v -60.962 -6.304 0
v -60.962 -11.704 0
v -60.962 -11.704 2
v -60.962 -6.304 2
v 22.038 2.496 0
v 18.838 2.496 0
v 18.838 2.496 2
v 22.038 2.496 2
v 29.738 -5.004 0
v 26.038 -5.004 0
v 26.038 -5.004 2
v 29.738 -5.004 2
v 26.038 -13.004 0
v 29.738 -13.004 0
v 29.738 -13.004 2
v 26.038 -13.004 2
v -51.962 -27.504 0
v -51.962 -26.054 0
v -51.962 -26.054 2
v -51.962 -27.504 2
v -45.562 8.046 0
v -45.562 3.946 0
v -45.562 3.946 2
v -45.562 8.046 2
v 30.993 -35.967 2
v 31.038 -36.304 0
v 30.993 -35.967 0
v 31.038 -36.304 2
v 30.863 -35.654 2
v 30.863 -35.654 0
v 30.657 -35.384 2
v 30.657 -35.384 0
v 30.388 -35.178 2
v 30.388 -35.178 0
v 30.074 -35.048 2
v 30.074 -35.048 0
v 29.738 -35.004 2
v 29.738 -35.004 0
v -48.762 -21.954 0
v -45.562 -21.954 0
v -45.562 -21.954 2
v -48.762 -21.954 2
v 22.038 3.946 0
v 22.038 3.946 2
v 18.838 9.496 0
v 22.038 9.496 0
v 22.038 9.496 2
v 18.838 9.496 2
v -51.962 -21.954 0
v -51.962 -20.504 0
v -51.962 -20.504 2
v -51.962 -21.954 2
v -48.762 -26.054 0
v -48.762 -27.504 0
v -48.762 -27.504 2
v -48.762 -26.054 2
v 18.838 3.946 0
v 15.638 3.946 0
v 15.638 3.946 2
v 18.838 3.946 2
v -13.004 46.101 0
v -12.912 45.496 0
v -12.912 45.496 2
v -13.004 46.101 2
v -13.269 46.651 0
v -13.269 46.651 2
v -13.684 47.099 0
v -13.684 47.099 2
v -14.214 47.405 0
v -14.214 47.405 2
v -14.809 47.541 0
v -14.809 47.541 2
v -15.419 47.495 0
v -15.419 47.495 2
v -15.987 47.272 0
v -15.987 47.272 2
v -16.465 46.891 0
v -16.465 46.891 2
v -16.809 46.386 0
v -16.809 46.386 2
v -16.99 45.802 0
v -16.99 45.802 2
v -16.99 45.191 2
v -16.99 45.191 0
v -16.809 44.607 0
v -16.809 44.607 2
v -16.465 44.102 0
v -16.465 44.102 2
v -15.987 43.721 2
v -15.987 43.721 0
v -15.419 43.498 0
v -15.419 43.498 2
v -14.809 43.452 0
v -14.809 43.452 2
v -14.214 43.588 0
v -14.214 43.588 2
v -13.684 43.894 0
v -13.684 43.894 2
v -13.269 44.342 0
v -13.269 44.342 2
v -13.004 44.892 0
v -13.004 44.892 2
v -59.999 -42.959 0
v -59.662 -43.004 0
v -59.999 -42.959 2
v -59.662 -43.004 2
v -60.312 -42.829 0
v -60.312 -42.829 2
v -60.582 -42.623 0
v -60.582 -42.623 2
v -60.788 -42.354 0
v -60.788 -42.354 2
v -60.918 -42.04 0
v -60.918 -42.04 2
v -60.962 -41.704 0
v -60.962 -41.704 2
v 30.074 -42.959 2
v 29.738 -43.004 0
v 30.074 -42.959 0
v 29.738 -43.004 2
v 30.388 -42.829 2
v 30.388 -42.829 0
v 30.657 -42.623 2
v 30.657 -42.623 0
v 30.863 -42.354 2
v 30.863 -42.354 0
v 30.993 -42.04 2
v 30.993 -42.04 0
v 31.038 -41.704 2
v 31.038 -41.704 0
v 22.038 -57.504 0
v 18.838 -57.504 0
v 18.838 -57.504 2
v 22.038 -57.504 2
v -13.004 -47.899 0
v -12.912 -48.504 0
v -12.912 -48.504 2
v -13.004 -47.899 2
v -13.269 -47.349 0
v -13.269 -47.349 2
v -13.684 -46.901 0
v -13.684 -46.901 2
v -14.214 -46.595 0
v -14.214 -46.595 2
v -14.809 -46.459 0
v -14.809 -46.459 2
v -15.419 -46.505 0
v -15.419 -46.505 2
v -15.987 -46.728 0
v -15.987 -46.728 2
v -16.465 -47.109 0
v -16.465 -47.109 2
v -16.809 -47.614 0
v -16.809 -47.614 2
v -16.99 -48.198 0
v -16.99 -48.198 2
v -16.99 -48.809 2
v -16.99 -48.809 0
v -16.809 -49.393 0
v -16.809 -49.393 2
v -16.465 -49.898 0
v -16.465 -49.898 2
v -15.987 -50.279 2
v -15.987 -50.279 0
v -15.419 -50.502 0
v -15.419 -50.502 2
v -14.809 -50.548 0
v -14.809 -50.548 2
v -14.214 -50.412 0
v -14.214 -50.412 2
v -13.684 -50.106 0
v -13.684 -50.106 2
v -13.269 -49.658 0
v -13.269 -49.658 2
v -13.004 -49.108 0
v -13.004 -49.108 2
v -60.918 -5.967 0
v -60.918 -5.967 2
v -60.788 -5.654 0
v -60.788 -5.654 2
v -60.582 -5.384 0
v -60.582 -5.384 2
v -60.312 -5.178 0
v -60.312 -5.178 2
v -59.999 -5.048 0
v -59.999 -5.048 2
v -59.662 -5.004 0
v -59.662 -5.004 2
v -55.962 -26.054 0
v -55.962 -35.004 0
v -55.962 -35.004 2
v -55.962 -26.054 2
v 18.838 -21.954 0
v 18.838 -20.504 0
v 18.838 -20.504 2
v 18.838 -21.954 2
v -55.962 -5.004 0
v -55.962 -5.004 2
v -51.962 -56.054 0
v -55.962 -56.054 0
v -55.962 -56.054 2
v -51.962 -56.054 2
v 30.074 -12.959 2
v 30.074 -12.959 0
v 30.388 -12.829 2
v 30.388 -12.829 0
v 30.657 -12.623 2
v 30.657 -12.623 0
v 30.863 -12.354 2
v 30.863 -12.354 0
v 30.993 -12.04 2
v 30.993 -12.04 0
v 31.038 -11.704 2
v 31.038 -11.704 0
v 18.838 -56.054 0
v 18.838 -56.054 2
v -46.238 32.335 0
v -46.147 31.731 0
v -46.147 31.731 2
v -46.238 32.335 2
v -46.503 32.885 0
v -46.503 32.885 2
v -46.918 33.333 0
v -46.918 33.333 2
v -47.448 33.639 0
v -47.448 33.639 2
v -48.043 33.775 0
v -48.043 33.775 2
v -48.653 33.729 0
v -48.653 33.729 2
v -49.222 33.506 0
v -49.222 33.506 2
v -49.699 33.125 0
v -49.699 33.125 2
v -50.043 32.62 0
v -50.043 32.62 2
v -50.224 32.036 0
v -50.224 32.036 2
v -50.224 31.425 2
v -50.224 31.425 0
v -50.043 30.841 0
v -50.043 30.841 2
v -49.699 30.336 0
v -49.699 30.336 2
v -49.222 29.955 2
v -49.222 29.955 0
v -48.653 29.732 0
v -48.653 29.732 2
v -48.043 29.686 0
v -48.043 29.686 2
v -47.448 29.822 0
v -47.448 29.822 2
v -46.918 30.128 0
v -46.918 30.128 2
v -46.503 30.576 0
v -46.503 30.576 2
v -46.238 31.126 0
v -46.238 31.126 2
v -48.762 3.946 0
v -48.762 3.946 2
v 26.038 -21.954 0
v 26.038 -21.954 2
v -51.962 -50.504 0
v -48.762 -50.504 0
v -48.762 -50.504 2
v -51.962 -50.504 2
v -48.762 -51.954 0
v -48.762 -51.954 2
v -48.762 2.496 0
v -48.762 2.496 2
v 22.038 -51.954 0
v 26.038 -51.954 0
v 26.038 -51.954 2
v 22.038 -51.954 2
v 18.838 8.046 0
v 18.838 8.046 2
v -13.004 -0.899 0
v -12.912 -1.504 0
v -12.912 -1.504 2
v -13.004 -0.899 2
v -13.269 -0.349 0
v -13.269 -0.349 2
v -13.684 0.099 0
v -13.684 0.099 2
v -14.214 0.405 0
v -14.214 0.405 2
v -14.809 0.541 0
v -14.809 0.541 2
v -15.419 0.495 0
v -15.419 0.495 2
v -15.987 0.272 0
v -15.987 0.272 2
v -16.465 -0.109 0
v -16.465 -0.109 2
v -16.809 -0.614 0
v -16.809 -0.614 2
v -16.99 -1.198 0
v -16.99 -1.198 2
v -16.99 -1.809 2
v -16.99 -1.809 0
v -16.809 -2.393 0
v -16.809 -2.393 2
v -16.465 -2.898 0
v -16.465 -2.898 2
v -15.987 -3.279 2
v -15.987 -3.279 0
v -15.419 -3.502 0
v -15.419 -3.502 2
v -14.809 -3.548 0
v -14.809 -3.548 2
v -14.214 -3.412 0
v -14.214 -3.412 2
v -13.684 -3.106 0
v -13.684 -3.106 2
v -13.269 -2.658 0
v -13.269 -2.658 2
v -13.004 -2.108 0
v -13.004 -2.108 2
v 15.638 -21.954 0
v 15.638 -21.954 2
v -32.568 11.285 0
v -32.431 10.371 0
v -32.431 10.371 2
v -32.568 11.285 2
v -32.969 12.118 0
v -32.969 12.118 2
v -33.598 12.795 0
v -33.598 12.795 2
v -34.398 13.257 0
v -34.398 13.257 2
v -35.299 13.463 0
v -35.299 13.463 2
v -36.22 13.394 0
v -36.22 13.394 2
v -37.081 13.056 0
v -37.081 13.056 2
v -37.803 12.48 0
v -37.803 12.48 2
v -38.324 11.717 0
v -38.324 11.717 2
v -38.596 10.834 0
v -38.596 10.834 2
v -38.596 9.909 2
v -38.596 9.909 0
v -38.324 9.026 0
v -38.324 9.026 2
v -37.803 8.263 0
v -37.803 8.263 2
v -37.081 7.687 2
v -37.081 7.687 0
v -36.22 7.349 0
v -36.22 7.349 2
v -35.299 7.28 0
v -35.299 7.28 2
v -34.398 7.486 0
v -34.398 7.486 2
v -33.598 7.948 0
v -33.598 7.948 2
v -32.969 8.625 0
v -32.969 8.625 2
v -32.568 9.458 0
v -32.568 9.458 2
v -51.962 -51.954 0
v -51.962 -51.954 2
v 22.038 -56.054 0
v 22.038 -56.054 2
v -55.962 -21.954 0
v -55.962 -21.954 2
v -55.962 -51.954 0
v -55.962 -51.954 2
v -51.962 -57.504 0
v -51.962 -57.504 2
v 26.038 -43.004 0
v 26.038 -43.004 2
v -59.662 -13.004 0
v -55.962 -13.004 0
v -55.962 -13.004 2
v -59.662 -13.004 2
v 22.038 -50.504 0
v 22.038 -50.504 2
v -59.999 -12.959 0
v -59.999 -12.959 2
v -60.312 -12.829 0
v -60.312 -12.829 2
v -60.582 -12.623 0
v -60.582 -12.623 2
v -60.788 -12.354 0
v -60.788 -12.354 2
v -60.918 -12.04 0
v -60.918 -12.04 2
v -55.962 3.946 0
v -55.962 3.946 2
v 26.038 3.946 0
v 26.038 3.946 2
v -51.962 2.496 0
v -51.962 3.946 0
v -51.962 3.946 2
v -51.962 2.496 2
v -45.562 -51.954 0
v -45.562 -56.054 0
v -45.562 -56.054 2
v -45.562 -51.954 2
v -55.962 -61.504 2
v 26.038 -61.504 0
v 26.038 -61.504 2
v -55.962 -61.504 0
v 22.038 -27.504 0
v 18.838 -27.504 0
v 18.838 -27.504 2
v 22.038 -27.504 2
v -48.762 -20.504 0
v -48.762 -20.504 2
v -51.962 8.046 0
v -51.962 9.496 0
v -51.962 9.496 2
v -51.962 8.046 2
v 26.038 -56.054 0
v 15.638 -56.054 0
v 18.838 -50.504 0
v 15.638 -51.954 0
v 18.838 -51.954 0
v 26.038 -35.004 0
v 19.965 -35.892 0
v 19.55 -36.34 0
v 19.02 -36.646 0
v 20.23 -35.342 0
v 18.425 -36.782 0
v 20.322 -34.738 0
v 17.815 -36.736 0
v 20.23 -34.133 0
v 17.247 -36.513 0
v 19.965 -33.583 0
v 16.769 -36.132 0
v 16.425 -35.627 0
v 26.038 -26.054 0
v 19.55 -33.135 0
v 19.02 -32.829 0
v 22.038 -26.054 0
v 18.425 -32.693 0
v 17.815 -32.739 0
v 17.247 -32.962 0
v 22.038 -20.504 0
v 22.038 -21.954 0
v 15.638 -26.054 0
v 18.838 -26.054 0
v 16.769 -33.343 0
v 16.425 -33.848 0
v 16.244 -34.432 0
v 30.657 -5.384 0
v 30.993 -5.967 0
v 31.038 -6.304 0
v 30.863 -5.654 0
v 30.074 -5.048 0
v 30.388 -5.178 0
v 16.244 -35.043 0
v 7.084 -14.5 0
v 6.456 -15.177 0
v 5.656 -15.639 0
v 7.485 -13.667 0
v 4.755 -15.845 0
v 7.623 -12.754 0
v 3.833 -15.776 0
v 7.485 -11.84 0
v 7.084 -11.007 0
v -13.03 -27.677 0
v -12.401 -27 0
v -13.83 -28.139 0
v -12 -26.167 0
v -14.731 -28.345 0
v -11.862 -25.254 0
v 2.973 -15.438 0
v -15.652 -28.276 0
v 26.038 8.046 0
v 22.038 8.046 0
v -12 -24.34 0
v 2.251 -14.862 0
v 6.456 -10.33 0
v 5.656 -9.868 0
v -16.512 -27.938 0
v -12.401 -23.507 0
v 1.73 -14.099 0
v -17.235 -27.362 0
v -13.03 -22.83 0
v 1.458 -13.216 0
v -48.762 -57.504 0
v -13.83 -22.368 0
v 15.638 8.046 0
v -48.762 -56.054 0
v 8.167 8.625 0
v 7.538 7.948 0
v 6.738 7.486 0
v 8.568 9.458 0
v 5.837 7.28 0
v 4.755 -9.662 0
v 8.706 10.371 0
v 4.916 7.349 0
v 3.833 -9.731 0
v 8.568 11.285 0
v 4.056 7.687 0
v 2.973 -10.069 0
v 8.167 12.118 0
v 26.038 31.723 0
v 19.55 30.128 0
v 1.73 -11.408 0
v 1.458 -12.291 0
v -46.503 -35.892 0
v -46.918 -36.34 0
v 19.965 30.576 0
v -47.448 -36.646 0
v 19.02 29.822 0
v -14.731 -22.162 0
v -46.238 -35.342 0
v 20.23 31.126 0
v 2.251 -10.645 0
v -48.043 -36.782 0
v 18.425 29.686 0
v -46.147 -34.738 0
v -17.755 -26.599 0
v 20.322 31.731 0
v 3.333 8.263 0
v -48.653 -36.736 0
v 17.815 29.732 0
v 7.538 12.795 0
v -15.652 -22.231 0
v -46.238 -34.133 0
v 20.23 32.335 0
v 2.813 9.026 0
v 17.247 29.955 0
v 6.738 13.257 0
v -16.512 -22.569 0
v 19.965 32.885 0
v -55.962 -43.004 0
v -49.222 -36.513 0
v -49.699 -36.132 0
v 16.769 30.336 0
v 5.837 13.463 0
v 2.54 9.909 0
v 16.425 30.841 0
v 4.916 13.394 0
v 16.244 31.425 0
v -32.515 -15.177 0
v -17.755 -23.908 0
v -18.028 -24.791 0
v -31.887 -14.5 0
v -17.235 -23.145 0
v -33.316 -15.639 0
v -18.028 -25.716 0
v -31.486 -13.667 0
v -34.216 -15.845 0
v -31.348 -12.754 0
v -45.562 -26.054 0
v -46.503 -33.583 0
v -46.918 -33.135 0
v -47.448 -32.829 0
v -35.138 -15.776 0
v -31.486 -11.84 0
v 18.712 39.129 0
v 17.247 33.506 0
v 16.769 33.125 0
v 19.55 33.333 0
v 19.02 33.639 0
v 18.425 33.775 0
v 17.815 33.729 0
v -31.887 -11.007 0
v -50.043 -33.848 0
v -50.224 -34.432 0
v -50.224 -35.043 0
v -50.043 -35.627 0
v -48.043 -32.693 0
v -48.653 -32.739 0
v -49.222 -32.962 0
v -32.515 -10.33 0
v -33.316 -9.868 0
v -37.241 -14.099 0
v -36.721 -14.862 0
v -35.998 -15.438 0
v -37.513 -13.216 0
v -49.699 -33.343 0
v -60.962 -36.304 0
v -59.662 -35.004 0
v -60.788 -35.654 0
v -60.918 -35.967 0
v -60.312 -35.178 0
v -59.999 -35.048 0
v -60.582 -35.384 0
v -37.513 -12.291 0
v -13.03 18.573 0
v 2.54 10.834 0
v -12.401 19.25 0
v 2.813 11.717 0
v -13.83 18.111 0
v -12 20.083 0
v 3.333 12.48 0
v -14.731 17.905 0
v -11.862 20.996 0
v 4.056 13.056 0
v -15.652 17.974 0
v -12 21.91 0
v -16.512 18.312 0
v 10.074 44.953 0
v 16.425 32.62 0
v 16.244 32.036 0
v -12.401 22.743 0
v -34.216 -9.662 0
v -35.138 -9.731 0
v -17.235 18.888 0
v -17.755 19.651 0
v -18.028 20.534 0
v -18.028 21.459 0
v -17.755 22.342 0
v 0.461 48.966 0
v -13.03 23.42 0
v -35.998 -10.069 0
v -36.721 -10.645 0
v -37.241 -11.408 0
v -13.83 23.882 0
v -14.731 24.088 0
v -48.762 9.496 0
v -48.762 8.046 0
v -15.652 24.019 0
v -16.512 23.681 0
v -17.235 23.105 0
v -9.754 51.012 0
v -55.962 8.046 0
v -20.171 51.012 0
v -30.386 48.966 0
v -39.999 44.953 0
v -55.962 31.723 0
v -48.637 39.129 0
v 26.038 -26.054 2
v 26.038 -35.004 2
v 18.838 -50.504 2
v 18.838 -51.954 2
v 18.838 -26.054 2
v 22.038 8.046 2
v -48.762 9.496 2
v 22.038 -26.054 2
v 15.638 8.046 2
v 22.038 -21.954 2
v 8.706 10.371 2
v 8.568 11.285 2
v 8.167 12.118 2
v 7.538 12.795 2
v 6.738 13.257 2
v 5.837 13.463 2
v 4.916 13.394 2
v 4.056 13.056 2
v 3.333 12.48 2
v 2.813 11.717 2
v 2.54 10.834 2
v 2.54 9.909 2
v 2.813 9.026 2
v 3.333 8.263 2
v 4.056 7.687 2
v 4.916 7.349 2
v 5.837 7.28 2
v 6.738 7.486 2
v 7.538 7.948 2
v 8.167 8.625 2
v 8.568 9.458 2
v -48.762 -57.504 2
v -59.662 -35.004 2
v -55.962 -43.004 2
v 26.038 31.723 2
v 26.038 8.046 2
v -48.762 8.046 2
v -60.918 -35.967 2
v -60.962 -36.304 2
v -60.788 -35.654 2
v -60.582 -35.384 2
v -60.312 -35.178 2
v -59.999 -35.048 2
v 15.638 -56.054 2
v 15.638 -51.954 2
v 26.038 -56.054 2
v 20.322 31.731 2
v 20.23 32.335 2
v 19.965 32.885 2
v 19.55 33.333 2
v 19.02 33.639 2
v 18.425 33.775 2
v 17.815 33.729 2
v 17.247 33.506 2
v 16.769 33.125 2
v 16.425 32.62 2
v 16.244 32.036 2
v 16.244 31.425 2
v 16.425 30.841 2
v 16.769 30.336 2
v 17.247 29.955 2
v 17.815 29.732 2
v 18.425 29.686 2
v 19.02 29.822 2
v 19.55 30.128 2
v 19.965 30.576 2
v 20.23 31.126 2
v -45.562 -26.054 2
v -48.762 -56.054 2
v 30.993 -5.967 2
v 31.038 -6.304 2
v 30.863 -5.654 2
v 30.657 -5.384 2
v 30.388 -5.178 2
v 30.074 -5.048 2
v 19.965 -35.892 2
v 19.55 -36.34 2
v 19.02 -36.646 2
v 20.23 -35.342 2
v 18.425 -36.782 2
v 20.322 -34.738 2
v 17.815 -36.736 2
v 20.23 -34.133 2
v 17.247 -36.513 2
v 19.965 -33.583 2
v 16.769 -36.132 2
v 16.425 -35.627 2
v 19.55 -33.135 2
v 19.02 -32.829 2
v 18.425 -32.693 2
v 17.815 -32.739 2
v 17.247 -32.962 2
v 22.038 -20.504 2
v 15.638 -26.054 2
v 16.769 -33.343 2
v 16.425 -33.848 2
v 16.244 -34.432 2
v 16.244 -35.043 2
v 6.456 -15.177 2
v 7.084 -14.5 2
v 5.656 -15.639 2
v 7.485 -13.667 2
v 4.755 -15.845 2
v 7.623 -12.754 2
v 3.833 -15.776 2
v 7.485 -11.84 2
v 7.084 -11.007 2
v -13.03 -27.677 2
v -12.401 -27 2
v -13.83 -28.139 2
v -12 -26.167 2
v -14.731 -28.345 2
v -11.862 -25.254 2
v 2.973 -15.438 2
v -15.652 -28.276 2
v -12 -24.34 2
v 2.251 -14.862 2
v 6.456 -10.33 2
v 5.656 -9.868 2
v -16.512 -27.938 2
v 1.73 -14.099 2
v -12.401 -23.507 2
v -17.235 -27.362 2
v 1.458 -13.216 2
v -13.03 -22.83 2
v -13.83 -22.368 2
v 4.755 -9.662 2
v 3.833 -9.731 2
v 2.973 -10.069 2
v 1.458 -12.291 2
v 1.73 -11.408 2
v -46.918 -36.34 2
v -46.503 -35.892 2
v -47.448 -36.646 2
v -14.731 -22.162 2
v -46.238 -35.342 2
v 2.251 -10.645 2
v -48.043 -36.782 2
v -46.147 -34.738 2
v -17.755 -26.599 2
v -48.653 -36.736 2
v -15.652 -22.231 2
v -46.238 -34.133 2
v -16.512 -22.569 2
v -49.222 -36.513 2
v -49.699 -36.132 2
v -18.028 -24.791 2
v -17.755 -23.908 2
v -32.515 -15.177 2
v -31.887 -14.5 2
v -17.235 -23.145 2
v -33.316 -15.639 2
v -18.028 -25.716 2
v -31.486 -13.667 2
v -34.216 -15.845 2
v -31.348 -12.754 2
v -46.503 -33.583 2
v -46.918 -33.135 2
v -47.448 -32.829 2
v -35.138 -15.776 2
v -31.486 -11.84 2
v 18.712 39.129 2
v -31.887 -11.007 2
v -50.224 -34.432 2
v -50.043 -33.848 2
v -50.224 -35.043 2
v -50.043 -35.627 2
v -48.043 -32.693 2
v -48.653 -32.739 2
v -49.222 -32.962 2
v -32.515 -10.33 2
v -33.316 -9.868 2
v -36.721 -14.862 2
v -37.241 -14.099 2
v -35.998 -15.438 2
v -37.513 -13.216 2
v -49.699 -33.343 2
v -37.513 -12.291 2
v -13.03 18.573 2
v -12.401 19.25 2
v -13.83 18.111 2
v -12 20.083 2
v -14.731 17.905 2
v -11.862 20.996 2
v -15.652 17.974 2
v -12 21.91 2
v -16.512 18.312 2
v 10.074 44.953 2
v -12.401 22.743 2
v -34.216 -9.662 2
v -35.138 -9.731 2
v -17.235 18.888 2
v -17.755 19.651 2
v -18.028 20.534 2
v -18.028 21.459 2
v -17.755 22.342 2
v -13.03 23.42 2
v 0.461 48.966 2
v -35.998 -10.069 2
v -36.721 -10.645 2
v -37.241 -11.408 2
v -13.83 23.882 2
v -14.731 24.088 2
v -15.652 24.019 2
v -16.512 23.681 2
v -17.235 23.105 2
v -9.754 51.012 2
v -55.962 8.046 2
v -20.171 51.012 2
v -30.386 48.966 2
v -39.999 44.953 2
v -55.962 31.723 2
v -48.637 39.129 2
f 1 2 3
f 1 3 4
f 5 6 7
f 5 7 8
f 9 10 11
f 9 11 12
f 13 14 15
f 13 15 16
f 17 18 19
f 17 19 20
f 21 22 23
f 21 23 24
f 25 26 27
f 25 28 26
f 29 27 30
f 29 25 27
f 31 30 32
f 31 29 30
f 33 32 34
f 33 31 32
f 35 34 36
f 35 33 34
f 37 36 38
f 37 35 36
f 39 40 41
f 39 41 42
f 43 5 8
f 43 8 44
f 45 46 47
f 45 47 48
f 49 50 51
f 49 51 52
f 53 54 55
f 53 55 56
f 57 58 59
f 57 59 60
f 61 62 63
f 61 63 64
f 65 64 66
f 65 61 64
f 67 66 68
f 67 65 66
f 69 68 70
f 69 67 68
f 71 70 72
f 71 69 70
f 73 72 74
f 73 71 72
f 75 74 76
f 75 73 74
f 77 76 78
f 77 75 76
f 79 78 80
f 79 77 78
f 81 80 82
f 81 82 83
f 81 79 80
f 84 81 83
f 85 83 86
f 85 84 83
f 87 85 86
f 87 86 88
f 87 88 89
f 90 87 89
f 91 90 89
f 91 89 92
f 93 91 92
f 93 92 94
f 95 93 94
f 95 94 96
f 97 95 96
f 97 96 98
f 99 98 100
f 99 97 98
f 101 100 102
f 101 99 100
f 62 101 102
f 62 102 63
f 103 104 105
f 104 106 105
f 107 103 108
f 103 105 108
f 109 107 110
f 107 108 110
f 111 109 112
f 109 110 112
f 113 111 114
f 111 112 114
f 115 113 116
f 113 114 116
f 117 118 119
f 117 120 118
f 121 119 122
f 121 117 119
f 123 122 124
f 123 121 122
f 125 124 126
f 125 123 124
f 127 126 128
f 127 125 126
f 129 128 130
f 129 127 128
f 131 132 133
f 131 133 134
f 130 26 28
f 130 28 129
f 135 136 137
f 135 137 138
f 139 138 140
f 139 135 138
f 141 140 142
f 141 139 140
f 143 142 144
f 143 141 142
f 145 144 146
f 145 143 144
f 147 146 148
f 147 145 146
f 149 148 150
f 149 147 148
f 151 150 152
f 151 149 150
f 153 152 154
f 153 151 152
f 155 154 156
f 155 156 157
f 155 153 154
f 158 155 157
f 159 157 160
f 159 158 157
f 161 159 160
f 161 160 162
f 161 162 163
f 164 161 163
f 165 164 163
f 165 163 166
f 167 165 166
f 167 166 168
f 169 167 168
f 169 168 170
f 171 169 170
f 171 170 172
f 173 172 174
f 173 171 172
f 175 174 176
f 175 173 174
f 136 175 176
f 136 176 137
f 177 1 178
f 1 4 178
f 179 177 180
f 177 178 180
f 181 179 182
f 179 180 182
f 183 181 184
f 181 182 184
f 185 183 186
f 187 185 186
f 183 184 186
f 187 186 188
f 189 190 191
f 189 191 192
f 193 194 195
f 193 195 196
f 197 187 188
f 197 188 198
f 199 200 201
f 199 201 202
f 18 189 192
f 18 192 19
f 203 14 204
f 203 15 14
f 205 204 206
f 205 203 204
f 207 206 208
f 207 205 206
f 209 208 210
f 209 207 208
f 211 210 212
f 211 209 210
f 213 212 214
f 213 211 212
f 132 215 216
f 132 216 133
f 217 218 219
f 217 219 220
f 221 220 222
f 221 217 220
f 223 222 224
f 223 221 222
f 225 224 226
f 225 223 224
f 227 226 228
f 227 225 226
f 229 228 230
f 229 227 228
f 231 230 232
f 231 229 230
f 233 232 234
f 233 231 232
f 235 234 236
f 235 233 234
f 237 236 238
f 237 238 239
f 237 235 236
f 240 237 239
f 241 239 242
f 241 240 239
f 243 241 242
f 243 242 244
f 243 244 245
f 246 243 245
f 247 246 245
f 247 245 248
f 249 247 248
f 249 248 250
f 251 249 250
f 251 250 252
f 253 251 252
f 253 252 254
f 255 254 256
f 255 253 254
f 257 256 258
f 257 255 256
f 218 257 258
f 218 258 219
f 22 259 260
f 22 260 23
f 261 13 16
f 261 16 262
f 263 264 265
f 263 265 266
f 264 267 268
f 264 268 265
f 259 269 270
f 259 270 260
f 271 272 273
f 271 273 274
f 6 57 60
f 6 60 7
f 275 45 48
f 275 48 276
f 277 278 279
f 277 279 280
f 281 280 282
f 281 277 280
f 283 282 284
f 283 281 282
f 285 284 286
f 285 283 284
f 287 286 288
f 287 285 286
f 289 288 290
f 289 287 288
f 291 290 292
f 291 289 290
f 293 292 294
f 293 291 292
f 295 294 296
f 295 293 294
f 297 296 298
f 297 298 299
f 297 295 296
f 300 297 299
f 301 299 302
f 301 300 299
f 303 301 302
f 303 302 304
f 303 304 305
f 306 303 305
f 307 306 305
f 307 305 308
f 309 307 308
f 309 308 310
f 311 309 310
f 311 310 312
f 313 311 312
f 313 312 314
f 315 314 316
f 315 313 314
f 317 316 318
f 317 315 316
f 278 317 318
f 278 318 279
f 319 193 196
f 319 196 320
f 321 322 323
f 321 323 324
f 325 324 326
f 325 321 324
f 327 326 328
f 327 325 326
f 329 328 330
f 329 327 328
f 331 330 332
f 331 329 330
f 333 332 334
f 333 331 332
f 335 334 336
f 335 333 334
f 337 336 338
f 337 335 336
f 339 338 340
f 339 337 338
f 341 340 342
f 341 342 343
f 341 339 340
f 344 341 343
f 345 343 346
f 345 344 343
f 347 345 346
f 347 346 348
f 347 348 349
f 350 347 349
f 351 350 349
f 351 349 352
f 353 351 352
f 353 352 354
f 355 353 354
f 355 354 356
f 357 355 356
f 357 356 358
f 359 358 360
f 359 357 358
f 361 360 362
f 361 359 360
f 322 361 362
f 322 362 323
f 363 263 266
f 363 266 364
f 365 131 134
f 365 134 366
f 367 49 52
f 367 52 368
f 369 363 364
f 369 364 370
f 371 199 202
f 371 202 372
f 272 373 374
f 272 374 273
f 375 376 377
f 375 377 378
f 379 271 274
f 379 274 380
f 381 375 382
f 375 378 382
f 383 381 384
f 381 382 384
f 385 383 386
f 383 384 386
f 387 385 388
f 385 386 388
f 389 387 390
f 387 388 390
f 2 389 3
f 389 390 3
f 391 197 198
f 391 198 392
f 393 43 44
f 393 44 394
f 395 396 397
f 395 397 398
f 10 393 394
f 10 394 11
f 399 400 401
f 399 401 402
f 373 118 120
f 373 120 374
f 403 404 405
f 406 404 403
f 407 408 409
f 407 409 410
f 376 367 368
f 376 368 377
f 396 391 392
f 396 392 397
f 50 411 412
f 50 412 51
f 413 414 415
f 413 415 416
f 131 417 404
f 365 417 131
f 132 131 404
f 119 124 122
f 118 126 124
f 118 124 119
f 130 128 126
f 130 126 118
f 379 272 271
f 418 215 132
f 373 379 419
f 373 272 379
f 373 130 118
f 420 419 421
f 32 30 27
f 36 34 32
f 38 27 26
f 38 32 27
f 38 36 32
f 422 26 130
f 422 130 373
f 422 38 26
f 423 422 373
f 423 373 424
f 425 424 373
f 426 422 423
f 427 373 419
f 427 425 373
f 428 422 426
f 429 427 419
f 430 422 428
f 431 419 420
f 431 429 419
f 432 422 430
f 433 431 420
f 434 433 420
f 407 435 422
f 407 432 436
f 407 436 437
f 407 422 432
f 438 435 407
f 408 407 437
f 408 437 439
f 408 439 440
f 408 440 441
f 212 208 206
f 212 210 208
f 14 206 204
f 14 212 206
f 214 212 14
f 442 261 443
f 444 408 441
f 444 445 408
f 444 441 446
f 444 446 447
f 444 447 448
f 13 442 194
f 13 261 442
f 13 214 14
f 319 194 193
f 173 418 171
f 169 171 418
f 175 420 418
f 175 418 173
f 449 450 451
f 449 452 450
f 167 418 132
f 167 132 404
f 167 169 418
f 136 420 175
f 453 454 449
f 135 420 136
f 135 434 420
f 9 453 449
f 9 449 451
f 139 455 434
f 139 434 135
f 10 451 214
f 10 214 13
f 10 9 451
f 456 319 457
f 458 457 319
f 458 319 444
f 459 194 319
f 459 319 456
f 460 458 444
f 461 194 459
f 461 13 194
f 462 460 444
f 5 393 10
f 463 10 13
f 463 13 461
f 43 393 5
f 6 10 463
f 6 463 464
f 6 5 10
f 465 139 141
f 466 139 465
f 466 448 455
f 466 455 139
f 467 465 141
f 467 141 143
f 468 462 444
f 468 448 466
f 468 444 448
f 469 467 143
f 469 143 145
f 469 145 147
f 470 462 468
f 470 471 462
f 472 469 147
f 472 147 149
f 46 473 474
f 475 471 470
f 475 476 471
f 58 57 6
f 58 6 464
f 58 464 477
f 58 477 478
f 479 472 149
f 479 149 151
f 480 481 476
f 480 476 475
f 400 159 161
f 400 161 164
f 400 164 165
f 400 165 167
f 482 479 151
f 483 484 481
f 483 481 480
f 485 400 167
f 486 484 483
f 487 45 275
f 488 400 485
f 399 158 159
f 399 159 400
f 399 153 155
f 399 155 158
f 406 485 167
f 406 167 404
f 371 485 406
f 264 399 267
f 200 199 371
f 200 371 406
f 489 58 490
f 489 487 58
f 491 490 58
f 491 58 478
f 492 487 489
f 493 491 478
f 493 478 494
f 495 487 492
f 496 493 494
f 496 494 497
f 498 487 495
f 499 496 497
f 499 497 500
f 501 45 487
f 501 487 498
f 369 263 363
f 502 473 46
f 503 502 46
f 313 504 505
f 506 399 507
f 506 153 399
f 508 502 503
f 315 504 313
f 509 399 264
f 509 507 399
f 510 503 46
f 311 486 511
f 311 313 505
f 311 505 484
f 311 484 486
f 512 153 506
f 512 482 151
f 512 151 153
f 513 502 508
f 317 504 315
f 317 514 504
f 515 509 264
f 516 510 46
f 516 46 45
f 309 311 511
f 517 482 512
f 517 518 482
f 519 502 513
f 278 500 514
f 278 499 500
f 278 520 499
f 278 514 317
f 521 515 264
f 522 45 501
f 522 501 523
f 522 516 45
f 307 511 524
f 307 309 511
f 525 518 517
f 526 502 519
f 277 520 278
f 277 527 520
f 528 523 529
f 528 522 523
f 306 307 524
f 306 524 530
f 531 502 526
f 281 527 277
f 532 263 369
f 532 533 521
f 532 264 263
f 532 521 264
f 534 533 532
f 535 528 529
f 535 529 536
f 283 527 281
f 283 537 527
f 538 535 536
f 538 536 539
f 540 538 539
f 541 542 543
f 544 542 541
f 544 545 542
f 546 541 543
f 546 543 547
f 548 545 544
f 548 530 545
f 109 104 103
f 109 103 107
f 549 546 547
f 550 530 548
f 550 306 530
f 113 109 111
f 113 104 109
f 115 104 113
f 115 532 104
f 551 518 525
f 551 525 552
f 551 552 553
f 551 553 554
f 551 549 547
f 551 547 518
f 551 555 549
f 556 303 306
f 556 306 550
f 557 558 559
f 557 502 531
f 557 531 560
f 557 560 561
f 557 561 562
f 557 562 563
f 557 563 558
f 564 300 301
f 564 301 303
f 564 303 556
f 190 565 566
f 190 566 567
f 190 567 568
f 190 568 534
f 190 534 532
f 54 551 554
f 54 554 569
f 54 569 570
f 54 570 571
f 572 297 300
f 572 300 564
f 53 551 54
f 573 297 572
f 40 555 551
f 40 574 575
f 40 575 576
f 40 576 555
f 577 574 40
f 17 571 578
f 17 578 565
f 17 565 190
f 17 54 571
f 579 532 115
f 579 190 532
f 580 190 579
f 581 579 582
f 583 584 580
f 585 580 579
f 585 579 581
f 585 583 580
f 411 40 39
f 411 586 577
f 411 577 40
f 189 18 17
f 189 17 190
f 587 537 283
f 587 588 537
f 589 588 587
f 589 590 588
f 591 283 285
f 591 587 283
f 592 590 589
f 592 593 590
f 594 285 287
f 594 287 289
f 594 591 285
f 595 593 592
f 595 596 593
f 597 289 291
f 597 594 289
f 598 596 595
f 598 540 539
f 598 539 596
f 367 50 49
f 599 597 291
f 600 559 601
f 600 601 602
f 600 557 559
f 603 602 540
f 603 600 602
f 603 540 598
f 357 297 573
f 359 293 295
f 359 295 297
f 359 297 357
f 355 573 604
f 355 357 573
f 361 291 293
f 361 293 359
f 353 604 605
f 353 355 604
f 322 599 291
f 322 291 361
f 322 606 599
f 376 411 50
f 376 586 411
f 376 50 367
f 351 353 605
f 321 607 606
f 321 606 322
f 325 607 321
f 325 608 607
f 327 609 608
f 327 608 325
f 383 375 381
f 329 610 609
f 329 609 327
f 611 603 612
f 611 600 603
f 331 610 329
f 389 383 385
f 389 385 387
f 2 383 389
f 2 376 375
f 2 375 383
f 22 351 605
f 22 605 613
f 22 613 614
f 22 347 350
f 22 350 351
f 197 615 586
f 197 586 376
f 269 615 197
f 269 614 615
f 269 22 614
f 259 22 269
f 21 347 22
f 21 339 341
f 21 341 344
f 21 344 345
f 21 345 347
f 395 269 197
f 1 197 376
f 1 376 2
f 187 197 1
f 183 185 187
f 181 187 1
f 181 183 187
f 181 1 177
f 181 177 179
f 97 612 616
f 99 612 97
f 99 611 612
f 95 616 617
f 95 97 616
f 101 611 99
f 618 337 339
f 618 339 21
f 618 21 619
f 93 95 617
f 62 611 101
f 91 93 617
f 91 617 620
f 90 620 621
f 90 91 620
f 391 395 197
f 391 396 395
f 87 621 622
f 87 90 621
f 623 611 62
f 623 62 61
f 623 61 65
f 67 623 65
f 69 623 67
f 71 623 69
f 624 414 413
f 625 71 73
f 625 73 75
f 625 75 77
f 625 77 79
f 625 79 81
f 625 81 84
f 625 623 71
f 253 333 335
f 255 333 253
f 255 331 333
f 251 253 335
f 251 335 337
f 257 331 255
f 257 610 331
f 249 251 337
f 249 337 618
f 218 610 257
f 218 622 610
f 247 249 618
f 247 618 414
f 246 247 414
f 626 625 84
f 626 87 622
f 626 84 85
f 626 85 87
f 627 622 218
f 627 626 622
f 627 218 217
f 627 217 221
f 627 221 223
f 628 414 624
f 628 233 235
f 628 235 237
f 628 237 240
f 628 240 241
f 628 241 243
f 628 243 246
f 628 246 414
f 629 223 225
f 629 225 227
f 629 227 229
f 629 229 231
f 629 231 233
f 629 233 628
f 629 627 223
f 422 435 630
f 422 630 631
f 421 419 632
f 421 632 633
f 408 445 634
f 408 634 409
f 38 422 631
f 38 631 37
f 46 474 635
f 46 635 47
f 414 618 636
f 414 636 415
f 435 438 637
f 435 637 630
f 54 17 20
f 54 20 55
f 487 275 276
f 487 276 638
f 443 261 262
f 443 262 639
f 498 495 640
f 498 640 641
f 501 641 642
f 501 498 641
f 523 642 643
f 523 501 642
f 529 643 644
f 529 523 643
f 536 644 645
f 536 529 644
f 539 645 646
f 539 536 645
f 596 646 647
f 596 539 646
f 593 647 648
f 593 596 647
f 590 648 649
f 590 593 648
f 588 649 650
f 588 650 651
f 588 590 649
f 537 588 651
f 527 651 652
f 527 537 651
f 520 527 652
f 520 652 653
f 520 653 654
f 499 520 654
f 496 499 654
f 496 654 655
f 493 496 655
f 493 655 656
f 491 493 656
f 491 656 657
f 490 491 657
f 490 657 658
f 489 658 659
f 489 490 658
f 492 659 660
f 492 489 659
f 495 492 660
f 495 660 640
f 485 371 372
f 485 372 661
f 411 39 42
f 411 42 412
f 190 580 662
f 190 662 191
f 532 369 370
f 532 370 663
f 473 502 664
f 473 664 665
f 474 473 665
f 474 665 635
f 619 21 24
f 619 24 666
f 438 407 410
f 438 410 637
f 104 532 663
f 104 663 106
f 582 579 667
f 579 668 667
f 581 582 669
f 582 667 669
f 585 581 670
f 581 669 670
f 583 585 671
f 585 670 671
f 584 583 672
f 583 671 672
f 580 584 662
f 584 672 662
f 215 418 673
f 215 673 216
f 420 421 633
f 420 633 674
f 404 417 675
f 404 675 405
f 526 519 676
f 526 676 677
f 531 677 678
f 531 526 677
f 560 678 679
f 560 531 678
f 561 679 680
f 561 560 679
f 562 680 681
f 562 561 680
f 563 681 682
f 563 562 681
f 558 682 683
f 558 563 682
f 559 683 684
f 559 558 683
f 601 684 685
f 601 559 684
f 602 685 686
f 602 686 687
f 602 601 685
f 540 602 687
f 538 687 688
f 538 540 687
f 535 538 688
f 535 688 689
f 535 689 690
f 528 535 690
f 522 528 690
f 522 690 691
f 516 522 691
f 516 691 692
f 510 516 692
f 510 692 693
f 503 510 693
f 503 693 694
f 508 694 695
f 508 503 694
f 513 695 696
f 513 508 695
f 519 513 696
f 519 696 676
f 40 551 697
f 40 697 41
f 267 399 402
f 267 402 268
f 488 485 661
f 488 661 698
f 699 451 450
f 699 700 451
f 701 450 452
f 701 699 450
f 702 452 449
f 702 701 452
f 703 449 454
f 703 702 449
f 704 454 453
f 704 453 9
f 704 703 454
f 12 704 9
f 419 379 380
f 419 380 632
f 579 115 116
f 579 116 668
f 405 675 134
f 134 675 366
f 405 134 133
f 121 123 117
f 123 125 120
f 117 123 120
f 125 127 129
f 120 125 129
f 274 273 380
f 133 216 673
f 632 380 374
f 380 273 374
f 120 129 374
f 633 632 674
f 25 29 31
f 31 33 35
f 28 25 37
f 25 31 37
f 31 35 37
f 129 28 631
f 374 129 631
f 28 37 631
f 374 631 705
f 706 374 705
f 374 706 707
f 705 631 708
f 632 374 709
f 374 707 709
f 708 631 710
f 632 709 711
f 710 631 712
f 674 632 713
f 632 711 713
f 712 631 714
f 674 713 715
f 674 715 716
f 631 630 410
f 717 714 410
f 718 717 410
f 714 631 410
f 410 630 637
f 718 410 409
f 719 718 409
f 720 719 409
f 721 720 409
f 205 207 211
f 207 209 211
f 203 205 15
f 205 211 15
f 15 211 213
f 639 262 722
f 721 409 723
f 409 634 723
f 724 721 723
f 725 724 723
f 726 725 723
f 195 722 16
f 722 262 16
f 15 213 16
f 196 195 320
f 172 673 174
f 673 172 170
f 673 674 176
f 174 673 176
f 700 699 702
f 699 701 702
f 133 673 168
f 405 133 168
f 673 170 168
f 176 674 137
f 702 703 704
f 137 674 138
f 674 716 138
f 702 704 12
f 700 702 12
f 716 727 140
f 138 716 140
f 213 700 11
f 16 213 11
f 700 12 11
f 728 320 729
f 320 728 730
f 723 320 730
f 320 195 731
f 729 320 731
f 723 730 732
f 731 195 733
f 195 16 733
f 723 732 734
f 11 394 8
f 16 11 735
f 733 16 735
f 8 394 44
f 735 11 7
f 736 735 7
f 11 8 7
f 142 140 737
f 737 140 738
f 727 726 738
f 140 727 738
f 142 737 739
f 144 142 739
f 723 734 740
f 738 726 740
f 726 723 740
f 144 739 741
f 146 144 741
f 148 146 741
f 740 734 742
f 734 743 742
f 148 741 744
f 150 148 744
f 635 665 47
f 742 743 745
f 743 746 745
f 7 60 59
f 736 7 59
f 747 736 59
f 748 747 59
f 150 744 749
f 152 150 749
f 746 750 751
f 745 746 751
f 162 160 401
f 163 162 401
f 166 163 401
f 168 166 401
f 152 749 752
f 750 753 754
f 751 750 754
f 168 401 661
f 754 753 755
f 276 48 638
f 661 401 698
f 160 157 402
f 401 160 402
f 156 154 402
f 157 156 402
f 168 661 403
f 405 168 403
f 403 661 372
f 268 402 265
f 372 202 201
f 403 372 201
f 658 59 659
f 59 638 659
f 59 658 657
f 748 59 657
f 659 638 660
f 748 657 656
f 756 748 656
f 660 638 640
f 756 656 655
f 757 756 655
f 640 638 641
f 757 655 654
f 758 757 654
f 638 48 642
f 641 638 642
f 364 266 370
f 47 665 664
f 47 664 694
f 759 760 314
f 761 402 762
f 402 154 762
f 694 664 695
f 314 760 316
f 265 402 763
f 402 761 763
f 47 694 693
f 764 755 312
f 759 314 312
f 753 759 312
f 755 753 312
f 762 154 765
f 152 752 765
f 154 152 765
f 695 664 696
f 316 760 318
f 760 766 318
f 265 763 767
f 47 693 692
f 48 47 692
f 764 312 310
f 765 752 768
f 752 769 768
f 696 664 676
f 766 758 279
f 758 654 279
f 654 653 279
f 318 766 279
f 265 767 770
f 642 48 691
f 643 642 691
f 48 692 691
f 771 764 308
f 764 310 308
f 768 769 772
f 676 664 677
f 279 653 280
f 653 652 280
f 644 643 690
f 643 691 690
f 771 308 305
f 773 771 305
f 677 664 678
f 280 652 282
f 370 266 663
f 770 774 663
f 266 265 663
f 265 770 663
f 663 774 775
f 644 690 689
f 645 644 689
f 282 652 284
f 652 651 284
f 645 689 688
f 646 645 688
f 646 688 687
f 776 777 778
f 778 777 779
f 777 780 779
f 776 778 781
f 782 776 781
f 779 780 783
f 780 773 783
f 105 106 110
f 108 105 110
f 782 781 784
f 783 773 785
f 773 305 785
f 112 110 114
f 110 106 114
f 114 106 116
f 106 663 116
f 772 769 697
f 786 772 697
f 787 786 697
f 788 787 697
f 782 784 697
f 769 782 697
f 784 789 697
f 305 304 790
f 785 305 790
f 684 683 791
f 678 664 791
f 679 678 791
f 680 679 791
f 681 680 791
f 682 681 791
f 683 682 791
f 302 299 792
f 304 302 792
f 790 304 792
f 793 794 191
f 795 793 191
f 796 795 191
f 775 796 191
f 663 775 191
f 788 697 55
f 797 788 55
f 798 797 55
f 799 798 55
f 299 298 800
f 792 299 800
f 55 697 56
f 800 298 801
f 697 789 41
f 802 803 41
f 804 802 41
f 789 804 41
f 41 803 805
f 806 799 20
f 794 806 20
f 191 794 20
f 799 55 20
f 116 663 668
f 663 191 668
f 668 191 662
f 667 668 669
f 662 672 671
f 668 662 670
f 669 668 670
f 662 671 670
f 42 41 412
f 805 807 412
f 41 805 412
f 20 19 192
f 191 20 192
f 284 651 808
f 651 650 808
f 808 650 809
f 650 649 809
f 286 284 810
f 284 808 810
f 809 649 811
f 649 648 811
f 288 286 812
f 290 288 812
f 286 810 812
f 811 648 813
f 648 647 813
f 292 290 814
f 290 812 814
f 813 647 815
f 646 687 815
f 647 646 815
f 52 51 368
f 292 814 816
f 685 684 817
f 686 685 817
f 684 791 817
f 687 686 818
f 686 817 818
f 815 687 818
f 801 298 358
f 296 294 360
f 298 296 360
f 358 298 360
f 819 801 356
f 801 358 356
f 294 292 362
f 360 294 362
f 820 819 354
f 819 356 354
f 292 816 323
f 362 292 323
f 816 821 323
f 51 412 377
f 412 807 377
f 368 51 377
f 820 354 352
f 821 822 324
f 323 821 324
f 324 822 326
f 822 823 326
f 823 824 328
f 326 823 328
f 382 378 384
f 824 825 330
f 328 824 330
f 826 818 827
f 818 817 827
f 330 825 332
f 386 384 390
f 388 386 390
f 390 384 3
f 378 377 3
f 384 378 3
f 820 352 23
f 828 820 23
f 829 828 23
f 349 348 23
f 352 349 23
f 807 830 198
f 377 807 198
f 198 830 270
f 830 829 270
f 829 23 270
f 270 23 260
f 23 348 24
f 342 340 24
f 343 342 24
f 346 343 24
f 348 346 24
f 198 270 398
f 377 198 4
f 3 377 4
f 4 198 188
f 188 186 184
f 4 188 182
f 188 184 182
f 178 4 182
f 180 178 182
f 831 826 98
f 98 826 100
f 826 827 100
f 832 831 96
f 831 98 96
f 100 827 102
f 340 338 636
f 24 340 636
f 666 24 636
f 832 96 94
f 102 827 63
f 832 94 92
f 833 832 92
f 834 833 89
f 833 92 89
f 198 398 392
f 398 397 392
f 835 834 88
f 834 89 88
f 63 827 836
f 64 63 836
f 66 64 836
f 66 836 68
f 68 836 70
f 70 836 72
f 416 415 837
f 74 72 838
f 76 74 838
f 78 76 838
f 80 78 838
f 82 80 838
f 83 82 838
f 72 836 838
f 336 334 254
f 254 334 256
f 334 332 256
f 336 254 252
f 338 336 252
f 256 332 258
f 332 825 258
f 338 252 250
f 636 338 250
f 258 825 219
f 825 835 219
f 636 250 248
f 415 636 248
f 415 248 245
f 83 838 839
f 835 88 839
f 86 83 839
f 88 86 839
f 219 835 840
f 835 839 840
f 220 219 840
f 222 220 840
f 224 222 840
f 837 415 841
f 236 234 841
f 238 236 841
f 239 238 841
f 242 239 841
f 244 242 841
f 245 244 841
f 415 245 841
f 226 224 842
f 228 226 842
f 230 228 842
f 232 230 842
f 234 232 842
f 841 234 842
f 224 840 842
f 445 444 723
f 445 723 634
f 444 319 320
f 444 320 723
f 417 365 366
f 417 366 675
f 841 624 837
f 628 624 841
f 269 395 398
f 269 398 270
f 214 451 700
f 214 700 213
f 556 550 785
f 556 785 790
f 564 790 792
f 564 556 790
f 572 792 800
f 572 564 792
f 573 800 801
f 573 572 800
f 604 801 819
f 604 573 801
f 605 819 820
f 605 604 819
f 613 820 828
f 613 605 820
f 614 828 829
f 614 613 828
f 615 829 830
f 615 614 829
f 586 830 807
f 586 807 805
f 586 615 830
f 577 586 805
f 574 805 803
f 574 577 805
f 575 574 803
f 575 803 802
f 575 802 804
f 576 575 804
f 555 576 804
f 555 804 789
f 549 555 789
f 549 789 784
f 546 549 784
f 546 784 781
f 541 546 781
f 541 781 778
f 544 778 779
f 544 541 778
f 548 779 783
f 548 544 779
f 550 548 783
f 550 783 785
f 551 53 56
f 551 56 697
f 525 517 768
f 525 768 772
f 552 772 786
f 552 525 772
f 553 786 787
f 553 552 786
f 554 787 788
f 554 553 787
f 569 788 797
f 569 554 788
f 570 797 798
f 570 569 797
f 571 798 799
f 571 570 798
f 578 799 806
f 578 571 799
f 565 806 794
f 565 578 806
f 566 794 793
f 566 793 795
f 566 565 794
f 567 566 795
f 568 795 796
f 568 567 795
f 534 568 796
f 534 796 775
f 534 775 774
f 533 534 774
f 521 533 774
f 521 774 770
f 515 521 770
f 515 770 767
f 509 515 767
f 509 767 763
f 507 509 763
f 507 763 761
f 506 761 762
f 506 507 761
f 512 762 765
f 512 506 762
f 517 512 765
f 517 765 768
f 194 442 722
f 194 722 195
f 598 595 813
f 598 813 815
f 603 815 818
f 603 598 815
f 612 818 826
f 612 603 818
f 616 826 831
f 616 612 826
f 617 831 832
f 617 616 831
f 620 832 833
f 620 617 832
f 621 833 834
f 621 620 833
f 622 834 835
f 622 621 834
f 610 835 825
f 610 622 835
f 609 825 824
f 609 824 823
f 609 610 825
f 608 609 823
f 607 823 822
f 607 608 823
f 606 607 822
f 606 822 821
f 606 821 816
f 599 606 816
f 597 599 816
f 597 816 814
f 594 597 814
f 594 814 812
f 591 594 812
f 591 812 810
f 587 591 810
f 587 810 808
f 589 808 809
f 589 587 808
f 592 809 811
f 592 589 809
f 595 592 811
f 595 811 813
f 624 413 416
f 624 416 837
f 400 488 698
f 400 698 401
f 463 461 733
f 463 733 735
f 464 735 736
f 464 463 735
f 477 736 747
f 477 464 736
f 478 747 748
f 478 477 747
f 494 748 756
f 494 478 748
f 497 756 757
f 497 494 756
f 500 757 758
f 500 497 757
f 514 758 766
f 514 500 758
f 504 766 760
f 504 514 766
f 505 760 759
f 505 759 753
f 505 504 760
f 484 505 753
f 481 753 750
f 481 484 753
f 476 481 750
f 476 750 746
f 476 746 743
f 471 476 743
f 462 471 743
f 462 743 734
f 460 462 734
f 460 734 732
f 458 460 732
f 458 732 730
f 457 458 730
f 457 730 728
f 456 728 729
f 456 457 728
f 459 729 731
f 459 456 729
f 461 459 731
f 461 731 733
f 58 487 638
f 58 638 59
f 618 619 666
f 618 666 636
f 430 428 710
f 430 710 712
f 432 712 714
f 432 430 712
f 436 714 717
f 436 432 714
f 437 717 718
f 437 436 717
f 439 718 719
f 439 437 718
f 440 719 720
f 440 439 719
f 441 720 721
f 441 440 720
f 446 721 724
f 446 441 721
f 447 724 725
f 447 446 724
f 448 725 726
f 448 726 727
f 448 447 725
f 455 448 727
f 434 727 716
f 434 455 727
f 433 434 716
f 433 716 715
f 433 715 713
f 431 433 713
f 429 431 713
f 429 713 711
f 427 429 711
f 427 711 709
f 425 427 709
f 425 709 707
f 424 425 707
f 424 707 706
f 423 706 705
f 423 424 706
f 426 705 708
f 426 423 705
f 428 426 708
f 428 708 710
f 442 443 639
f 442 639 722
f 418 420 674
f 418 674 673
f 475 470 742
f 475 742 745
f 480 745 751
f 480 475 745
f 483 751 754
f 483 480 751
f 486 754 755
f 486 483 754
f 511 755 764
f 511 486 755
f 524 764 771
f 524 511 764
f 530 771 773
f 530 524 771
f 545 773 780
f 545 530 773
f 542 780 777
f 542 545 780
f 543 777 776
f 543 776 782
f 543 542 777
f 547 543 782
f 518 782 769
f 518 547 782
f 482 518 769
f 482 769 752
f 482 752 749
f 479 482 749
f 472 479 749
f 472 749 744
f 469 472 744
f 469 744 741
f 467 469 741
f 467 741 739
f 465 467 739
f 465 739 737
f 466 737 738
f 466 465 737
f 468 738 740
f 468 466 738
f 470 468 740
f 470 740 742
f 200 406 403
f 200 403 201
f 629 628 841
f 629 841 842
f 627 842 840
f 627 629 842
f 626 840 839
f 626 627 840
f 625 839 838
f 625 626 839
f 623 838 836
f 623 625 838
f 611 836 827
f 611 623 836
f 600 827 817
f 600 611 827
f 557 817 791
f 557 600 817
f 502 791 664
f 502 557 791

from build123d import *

# Parameters (mm, degrees)
SKETCH_1_R      = 3.1
SKETCH_1_R_2    = 2.05
EXTRUDE_2_DEPTH = 2
FILLET_1_R      = 1.3


with BuildPart() as part:
    # 草图1 → 凸台-拉伸2 (new body)
    with BuildSketch(Plane.XY):
        with BuildLine():
            Line((26.037512023, -61.503506411), (-55.962487977, -61.503506411))
            Line((-55.962487977, -61.503506411), (-55.962487977, -56.053506411))
            Line((-55.962487977, -56.053506411), (-51.962487977, -56.053506411))
            Line((-51.962487977, -56.053506411), (-51.962487977, -57.503506411))
            Line((-51.962487977, -57.503506411), (-48.762487977, -57.503506411))
            Line((-48.762487977, -57.503506411), (-48.762487977, -56.053506411))
            Line((-48.762487977, -56.053506411), (-45.562487977, -56.053506411))
            Line((-45.562487977, -56.053506411), (-45.562487977, -51.953506411))
            Line((-45.562487977, -51.953506411), (-48.762487977, -51.953506411))
            Line((-48.762487977, -51.953506411), (-48.762487977, -50.503506411))
            Line((-48.762487977, -50.503506411), (-51.962487977, -50.503506411))
            Line((-51.962487977, -50.503506411), (-51.962487977, -51.953506411))
            Line((-51.962487977, -51.953506411), (-55.962487977, -51.953506411))
            Line((-55.962487977, -51.953506411), (-55.962487977, -43.003506411))
            Line((-55.962487977, -43.003506411), (-60.962487977, -43.003506411))
            Line((-60.962487977, -43.003506411), (-60.962487977, -35.003506411))
            Line((-60.962487977, -35.003506411), (-55.962487977, -35.003506411))
            Line((-55.962487977, -35.003506411), (-55.962487977, -26.053506411))
            Line((-55.962487977, -26.053506411), (-51.962487977, -26.053506411))
            Line((-51.962487977, -26.053506411), (-51.962487977, -27.503506411))
            Line((-51.962487977, -27.503506411), (-48.762487977, -27.503506411))
            Line((-48.762487977, -27.503506411), (-48.762487977, -26.053506411))
            Line((-48.762487977, -26.053506411), (-45.562487977, -26.053506411))
            Line((-45.562487977, -26.053506411), (-45.562487977, -21.953506411))
            Line((-45.562487977, -21.953506411), (-48.762487977, -21.953506411))
            Line((-48.762487977, -21.953506411), (-48.762487977, -20.503506411))
            Line((-48.762487977, -20.503506411), (-51.962487977, -20.503506411))
            Line((-51.962487977, -20.503506411), (-51.962487977, -21.953506411))
            Line((-51.962487977, -21.953506411), (-55.962487977, -21.953506411))
            Line((-55.962487977, -21.953506411), (-55.962487977, -13.003506411))
            Line((-55.962487977, -13.003506411), (-60.962487977, -13.003506411))
            Line((-60.962487977, -13.003506411), (-60.962487977, -5.003506411))
            Line((-60.962487977, -5.003506411), (-55.962487977, -5.003506411))
            Line((-55.962487977, -5.003506411), (-55.962487977, 3.946493589))
            Line((-55.962487977, 3.946493589), (-51.962487977, 3.946493589))
            Line((-51.962487977, 3.946493589), (-51.962487977, 2.496493589))
            Line((-51.962487977, 2.496493589), (-48.762487977, 2.496493589))
            Line((-48.762487977, 2.496493589), (-48.762487977, 3.946493589))
            Line((-48.762487977, 3.946493589), (-45.562487977, 3.946493589))
            Line((-45.562487977, 3.946493589), (-45.562487977, 8.046493589))
            Line((-45.562487977, 8.046493589), (-48.762487977, 8.046493589))
            Line((-48.762487977, 8.046493589), (-48.762487977, 9.496493589))
            Line((-48.762487977, 9.496493589), (-51.962487977, 9.496493589))
            Line((-51.962487977, 9.496493589), (-51.962487977, 8.046493589))
            Line((-51.962487977, 8.046493589), (-55.962487977, 8.046493589))
            Line((-55.962487977, 8.046493589), (-55.962487977, 23.496493589))
            Line((-55.962487977, 23.496493589), (-55.962487977, 31.722989041))
            ThreePointArc((-55.962487977, 31.722989041), (-14.962487977, 51.269592797), (26.037512023, 31.722989041))
            Line((26.037512023, 31.722989041), (26.037512023, 23.496493589))
            Line((26.037512023, 23.496493589), (26.037512023, 8.046493589))
            Line((26.037512023, 8.046493589), (22.037512023, 8.046493589))
            Line((22.037512023, 8.046493589), (22.037512023, 9.496493589))
            Line((22.037512023, 9.496493589), (18.837512023, 9.496493589))
            Line((18.837512023, 9.496493589), (18.837512023, 8.046493589))
            Line((18.837512023, 8.046493589), (15.637512023, 8.046493589))
            Line((15.637512023, 8.046493589), (15.637512023, 3.946493589))
            Line((15.637512023, 3.946493589), (18.837512023, 3.946493589))
            Line((18.837512023, 3.946493589), (18.837512023, 2.496493589))
            Line((18.837512023, 2.496493589), (22.037512023, 2.496493589))
            Line((22.037512023, 2.496493589), (22.037512023, 3.946493589))
            Line((22.037512023, 3.946493589), (26.037512023, 3.946493589))
            Line((26.037512023, 3.946493589), (26.037512023, -5.003506411))
            Line((26.037512023, -5.003506411), (31.037512023, -5.003506411))
            Line((31.037512023, -5.003506411), (31.037512023, -13.003506411))
            Line((31.037512023, -13.003506411), (26.037512023, -13.003506411))
            Line((26.037512023, -13.003506411), (26.037512023, -21.953506411))
            Line((26.037512023, -21.953506411), (22.037512023, -21.953506411))
            Line((22.037512023, -21.953506411), (22.037512023, -20.503506411))
            Line((22.037512023, -20.503506411), (18.837512023, -20.503506411))
            Line((18.837512023, -20.503506411), (18.837512023, -21.953506411))
            Line((18.837512023, -21.953506411), (15.637512023, -21.953506411))
            Line((15.637512023, -21.953506411), (15.637512023, -26.053506411))
            Line((15.637512023, -26.053506411), (18.837512023, -26.053506411))
            Line((18.837512023, -26.053506411), (18.837512023, -27.503506411))
            Line((18.837512023, -27.503506411), (22.037512023, -27.503506411))
            Line((22.037512023, -27.503506411), (22.037512023, -26.053506411))
            Line((22.037512023, -26.053506411), (26.037512023, -26.053506411))
            Line((26.037512023, -26.053506411), (26.037512023, -35.003506411))
            Line((26.037512023, -35.003506411), (31.037512023, -35.003506411))
            Line((31.037512023, -35.003506411), (31.037512023, -43.003506411))
            Line((31.037512023, -43.003506411), (26.037512023, -43.003506411))
            Line((26.037512023, -43.003506411), (26.037512023, -51.953506411))
            Line((26.037512023, -51.953506411), (22.037512023, -51.953506411))
            Line((22.037512023, -51.953506411), (22.037512023, -50.503506411))
            Line((22.037512023, -50.503506411), (18.837512023, -50.503506411))
            Line((18.837512023, -50.503506411), (18.837512023, -51.953506411))
            Line((18.837512023, -51.953506411), (15.637512023, -51.953506411))
            Line((15.637512023, -51.953506411), (15.637512023, -56.053506411))
            Line((15.637512023, -56.053506411), (18.837512023, -56.053506411))
            Line((18.837512023, -56.053506411), (18.837512023, -57.503506411))
            Line((18.837512023, -57.503506411), (22.037512023, -57.503506411))
            Line((22.037512023, -57.503506411), (22.037512023, -56.053506411))
            Line((22.037512023, -56.053506411), (26.037512023, -56.053506411))
            Line((26.037512023, -56.053506411), (26.037512023, -61.503506411))
        make_face()
        with Locations((-14.962487977, -25.253506411)):
            Circle(SKETCH_1_R, mode=Mode.SUBTRACT)
        with Locations((4.523083608, -12.753506411)):
            Circle(SKETCH_1_R, mode=Mode.SUBTRACT)
        with Locations((-14.962487977, -1.503506411)):
            Circle(SKETCH_1_R_2, mode=Mode.SUBTRACT)
        with Locations((-35.530591317, 10.371493589)):
            Circle(SKETCH_1_R, mode=Mode.SUBTRACT)
        with Locations((-34.448059562, -12.753506411)):
            Circle(SKETCH_1_R, mode=Mode.SUBTRACT)
        with Locations((5.605615363, 10.371493589)):
            Circle(SKETCH_1_R, mode=Mode.SUBTRACT)
        with Locations((-14.962487977, 20.996493589)):
            Circle(SKETCH_1_R, mode=Mode.SUBTRACT)
        with Locations((18.271530739, -34.737525127)):
            Circle(SKETCH_1_R_2, mode=Mode.SUBTRACT)
        with Locations((-14.962487977, -48.503506411)):
            Circle(SKETCH_1_R_2, mode=Mode.SUBTRACT)
        with Locations((-48.196506692, -34.737525127)):
            Circle(SKETCH_1_R_2, mode=Mode.SUBTRACT)
        with Locations((-48.196506692, 31.730512305)):
            Circle(SKETCH_1_R_2, mode=Mode.SUBTRACT)
        with Locations((-14.962487977, 45.496493589)):
            Circle(SKETCH_1_R_2, mode=Mode.SUBTRACT)
        with Locations((18.271530739, 31.730512305)):
            Circle(SKETCH_1_R_2, mode=Mode.SUBTRACT)
    extrude(amount=EXTRUDE_2_DEPTH)

    # 圆角1
    fillet_1_edges = [part.edges().sort_by_distance(p)[0] for p in [
        (-60.962487977, -43.003506411, 1),
        (-60.962487977, -35.003506411, 1),
        (-60.962487977, -13.003506411, 1),
        (-60.962487977, -5.003506411, 1),
        (31.037512023, -5.003506411, 1),
        (31.037512023, -13.003506411, 1),
        (31.037512023, -35.003506411, 1),
        (31.037512023, -43.003506411, 1),
    ]]
    fillet(fillet_1_edges, radius=FILLET_1_R)


solid = part.part
